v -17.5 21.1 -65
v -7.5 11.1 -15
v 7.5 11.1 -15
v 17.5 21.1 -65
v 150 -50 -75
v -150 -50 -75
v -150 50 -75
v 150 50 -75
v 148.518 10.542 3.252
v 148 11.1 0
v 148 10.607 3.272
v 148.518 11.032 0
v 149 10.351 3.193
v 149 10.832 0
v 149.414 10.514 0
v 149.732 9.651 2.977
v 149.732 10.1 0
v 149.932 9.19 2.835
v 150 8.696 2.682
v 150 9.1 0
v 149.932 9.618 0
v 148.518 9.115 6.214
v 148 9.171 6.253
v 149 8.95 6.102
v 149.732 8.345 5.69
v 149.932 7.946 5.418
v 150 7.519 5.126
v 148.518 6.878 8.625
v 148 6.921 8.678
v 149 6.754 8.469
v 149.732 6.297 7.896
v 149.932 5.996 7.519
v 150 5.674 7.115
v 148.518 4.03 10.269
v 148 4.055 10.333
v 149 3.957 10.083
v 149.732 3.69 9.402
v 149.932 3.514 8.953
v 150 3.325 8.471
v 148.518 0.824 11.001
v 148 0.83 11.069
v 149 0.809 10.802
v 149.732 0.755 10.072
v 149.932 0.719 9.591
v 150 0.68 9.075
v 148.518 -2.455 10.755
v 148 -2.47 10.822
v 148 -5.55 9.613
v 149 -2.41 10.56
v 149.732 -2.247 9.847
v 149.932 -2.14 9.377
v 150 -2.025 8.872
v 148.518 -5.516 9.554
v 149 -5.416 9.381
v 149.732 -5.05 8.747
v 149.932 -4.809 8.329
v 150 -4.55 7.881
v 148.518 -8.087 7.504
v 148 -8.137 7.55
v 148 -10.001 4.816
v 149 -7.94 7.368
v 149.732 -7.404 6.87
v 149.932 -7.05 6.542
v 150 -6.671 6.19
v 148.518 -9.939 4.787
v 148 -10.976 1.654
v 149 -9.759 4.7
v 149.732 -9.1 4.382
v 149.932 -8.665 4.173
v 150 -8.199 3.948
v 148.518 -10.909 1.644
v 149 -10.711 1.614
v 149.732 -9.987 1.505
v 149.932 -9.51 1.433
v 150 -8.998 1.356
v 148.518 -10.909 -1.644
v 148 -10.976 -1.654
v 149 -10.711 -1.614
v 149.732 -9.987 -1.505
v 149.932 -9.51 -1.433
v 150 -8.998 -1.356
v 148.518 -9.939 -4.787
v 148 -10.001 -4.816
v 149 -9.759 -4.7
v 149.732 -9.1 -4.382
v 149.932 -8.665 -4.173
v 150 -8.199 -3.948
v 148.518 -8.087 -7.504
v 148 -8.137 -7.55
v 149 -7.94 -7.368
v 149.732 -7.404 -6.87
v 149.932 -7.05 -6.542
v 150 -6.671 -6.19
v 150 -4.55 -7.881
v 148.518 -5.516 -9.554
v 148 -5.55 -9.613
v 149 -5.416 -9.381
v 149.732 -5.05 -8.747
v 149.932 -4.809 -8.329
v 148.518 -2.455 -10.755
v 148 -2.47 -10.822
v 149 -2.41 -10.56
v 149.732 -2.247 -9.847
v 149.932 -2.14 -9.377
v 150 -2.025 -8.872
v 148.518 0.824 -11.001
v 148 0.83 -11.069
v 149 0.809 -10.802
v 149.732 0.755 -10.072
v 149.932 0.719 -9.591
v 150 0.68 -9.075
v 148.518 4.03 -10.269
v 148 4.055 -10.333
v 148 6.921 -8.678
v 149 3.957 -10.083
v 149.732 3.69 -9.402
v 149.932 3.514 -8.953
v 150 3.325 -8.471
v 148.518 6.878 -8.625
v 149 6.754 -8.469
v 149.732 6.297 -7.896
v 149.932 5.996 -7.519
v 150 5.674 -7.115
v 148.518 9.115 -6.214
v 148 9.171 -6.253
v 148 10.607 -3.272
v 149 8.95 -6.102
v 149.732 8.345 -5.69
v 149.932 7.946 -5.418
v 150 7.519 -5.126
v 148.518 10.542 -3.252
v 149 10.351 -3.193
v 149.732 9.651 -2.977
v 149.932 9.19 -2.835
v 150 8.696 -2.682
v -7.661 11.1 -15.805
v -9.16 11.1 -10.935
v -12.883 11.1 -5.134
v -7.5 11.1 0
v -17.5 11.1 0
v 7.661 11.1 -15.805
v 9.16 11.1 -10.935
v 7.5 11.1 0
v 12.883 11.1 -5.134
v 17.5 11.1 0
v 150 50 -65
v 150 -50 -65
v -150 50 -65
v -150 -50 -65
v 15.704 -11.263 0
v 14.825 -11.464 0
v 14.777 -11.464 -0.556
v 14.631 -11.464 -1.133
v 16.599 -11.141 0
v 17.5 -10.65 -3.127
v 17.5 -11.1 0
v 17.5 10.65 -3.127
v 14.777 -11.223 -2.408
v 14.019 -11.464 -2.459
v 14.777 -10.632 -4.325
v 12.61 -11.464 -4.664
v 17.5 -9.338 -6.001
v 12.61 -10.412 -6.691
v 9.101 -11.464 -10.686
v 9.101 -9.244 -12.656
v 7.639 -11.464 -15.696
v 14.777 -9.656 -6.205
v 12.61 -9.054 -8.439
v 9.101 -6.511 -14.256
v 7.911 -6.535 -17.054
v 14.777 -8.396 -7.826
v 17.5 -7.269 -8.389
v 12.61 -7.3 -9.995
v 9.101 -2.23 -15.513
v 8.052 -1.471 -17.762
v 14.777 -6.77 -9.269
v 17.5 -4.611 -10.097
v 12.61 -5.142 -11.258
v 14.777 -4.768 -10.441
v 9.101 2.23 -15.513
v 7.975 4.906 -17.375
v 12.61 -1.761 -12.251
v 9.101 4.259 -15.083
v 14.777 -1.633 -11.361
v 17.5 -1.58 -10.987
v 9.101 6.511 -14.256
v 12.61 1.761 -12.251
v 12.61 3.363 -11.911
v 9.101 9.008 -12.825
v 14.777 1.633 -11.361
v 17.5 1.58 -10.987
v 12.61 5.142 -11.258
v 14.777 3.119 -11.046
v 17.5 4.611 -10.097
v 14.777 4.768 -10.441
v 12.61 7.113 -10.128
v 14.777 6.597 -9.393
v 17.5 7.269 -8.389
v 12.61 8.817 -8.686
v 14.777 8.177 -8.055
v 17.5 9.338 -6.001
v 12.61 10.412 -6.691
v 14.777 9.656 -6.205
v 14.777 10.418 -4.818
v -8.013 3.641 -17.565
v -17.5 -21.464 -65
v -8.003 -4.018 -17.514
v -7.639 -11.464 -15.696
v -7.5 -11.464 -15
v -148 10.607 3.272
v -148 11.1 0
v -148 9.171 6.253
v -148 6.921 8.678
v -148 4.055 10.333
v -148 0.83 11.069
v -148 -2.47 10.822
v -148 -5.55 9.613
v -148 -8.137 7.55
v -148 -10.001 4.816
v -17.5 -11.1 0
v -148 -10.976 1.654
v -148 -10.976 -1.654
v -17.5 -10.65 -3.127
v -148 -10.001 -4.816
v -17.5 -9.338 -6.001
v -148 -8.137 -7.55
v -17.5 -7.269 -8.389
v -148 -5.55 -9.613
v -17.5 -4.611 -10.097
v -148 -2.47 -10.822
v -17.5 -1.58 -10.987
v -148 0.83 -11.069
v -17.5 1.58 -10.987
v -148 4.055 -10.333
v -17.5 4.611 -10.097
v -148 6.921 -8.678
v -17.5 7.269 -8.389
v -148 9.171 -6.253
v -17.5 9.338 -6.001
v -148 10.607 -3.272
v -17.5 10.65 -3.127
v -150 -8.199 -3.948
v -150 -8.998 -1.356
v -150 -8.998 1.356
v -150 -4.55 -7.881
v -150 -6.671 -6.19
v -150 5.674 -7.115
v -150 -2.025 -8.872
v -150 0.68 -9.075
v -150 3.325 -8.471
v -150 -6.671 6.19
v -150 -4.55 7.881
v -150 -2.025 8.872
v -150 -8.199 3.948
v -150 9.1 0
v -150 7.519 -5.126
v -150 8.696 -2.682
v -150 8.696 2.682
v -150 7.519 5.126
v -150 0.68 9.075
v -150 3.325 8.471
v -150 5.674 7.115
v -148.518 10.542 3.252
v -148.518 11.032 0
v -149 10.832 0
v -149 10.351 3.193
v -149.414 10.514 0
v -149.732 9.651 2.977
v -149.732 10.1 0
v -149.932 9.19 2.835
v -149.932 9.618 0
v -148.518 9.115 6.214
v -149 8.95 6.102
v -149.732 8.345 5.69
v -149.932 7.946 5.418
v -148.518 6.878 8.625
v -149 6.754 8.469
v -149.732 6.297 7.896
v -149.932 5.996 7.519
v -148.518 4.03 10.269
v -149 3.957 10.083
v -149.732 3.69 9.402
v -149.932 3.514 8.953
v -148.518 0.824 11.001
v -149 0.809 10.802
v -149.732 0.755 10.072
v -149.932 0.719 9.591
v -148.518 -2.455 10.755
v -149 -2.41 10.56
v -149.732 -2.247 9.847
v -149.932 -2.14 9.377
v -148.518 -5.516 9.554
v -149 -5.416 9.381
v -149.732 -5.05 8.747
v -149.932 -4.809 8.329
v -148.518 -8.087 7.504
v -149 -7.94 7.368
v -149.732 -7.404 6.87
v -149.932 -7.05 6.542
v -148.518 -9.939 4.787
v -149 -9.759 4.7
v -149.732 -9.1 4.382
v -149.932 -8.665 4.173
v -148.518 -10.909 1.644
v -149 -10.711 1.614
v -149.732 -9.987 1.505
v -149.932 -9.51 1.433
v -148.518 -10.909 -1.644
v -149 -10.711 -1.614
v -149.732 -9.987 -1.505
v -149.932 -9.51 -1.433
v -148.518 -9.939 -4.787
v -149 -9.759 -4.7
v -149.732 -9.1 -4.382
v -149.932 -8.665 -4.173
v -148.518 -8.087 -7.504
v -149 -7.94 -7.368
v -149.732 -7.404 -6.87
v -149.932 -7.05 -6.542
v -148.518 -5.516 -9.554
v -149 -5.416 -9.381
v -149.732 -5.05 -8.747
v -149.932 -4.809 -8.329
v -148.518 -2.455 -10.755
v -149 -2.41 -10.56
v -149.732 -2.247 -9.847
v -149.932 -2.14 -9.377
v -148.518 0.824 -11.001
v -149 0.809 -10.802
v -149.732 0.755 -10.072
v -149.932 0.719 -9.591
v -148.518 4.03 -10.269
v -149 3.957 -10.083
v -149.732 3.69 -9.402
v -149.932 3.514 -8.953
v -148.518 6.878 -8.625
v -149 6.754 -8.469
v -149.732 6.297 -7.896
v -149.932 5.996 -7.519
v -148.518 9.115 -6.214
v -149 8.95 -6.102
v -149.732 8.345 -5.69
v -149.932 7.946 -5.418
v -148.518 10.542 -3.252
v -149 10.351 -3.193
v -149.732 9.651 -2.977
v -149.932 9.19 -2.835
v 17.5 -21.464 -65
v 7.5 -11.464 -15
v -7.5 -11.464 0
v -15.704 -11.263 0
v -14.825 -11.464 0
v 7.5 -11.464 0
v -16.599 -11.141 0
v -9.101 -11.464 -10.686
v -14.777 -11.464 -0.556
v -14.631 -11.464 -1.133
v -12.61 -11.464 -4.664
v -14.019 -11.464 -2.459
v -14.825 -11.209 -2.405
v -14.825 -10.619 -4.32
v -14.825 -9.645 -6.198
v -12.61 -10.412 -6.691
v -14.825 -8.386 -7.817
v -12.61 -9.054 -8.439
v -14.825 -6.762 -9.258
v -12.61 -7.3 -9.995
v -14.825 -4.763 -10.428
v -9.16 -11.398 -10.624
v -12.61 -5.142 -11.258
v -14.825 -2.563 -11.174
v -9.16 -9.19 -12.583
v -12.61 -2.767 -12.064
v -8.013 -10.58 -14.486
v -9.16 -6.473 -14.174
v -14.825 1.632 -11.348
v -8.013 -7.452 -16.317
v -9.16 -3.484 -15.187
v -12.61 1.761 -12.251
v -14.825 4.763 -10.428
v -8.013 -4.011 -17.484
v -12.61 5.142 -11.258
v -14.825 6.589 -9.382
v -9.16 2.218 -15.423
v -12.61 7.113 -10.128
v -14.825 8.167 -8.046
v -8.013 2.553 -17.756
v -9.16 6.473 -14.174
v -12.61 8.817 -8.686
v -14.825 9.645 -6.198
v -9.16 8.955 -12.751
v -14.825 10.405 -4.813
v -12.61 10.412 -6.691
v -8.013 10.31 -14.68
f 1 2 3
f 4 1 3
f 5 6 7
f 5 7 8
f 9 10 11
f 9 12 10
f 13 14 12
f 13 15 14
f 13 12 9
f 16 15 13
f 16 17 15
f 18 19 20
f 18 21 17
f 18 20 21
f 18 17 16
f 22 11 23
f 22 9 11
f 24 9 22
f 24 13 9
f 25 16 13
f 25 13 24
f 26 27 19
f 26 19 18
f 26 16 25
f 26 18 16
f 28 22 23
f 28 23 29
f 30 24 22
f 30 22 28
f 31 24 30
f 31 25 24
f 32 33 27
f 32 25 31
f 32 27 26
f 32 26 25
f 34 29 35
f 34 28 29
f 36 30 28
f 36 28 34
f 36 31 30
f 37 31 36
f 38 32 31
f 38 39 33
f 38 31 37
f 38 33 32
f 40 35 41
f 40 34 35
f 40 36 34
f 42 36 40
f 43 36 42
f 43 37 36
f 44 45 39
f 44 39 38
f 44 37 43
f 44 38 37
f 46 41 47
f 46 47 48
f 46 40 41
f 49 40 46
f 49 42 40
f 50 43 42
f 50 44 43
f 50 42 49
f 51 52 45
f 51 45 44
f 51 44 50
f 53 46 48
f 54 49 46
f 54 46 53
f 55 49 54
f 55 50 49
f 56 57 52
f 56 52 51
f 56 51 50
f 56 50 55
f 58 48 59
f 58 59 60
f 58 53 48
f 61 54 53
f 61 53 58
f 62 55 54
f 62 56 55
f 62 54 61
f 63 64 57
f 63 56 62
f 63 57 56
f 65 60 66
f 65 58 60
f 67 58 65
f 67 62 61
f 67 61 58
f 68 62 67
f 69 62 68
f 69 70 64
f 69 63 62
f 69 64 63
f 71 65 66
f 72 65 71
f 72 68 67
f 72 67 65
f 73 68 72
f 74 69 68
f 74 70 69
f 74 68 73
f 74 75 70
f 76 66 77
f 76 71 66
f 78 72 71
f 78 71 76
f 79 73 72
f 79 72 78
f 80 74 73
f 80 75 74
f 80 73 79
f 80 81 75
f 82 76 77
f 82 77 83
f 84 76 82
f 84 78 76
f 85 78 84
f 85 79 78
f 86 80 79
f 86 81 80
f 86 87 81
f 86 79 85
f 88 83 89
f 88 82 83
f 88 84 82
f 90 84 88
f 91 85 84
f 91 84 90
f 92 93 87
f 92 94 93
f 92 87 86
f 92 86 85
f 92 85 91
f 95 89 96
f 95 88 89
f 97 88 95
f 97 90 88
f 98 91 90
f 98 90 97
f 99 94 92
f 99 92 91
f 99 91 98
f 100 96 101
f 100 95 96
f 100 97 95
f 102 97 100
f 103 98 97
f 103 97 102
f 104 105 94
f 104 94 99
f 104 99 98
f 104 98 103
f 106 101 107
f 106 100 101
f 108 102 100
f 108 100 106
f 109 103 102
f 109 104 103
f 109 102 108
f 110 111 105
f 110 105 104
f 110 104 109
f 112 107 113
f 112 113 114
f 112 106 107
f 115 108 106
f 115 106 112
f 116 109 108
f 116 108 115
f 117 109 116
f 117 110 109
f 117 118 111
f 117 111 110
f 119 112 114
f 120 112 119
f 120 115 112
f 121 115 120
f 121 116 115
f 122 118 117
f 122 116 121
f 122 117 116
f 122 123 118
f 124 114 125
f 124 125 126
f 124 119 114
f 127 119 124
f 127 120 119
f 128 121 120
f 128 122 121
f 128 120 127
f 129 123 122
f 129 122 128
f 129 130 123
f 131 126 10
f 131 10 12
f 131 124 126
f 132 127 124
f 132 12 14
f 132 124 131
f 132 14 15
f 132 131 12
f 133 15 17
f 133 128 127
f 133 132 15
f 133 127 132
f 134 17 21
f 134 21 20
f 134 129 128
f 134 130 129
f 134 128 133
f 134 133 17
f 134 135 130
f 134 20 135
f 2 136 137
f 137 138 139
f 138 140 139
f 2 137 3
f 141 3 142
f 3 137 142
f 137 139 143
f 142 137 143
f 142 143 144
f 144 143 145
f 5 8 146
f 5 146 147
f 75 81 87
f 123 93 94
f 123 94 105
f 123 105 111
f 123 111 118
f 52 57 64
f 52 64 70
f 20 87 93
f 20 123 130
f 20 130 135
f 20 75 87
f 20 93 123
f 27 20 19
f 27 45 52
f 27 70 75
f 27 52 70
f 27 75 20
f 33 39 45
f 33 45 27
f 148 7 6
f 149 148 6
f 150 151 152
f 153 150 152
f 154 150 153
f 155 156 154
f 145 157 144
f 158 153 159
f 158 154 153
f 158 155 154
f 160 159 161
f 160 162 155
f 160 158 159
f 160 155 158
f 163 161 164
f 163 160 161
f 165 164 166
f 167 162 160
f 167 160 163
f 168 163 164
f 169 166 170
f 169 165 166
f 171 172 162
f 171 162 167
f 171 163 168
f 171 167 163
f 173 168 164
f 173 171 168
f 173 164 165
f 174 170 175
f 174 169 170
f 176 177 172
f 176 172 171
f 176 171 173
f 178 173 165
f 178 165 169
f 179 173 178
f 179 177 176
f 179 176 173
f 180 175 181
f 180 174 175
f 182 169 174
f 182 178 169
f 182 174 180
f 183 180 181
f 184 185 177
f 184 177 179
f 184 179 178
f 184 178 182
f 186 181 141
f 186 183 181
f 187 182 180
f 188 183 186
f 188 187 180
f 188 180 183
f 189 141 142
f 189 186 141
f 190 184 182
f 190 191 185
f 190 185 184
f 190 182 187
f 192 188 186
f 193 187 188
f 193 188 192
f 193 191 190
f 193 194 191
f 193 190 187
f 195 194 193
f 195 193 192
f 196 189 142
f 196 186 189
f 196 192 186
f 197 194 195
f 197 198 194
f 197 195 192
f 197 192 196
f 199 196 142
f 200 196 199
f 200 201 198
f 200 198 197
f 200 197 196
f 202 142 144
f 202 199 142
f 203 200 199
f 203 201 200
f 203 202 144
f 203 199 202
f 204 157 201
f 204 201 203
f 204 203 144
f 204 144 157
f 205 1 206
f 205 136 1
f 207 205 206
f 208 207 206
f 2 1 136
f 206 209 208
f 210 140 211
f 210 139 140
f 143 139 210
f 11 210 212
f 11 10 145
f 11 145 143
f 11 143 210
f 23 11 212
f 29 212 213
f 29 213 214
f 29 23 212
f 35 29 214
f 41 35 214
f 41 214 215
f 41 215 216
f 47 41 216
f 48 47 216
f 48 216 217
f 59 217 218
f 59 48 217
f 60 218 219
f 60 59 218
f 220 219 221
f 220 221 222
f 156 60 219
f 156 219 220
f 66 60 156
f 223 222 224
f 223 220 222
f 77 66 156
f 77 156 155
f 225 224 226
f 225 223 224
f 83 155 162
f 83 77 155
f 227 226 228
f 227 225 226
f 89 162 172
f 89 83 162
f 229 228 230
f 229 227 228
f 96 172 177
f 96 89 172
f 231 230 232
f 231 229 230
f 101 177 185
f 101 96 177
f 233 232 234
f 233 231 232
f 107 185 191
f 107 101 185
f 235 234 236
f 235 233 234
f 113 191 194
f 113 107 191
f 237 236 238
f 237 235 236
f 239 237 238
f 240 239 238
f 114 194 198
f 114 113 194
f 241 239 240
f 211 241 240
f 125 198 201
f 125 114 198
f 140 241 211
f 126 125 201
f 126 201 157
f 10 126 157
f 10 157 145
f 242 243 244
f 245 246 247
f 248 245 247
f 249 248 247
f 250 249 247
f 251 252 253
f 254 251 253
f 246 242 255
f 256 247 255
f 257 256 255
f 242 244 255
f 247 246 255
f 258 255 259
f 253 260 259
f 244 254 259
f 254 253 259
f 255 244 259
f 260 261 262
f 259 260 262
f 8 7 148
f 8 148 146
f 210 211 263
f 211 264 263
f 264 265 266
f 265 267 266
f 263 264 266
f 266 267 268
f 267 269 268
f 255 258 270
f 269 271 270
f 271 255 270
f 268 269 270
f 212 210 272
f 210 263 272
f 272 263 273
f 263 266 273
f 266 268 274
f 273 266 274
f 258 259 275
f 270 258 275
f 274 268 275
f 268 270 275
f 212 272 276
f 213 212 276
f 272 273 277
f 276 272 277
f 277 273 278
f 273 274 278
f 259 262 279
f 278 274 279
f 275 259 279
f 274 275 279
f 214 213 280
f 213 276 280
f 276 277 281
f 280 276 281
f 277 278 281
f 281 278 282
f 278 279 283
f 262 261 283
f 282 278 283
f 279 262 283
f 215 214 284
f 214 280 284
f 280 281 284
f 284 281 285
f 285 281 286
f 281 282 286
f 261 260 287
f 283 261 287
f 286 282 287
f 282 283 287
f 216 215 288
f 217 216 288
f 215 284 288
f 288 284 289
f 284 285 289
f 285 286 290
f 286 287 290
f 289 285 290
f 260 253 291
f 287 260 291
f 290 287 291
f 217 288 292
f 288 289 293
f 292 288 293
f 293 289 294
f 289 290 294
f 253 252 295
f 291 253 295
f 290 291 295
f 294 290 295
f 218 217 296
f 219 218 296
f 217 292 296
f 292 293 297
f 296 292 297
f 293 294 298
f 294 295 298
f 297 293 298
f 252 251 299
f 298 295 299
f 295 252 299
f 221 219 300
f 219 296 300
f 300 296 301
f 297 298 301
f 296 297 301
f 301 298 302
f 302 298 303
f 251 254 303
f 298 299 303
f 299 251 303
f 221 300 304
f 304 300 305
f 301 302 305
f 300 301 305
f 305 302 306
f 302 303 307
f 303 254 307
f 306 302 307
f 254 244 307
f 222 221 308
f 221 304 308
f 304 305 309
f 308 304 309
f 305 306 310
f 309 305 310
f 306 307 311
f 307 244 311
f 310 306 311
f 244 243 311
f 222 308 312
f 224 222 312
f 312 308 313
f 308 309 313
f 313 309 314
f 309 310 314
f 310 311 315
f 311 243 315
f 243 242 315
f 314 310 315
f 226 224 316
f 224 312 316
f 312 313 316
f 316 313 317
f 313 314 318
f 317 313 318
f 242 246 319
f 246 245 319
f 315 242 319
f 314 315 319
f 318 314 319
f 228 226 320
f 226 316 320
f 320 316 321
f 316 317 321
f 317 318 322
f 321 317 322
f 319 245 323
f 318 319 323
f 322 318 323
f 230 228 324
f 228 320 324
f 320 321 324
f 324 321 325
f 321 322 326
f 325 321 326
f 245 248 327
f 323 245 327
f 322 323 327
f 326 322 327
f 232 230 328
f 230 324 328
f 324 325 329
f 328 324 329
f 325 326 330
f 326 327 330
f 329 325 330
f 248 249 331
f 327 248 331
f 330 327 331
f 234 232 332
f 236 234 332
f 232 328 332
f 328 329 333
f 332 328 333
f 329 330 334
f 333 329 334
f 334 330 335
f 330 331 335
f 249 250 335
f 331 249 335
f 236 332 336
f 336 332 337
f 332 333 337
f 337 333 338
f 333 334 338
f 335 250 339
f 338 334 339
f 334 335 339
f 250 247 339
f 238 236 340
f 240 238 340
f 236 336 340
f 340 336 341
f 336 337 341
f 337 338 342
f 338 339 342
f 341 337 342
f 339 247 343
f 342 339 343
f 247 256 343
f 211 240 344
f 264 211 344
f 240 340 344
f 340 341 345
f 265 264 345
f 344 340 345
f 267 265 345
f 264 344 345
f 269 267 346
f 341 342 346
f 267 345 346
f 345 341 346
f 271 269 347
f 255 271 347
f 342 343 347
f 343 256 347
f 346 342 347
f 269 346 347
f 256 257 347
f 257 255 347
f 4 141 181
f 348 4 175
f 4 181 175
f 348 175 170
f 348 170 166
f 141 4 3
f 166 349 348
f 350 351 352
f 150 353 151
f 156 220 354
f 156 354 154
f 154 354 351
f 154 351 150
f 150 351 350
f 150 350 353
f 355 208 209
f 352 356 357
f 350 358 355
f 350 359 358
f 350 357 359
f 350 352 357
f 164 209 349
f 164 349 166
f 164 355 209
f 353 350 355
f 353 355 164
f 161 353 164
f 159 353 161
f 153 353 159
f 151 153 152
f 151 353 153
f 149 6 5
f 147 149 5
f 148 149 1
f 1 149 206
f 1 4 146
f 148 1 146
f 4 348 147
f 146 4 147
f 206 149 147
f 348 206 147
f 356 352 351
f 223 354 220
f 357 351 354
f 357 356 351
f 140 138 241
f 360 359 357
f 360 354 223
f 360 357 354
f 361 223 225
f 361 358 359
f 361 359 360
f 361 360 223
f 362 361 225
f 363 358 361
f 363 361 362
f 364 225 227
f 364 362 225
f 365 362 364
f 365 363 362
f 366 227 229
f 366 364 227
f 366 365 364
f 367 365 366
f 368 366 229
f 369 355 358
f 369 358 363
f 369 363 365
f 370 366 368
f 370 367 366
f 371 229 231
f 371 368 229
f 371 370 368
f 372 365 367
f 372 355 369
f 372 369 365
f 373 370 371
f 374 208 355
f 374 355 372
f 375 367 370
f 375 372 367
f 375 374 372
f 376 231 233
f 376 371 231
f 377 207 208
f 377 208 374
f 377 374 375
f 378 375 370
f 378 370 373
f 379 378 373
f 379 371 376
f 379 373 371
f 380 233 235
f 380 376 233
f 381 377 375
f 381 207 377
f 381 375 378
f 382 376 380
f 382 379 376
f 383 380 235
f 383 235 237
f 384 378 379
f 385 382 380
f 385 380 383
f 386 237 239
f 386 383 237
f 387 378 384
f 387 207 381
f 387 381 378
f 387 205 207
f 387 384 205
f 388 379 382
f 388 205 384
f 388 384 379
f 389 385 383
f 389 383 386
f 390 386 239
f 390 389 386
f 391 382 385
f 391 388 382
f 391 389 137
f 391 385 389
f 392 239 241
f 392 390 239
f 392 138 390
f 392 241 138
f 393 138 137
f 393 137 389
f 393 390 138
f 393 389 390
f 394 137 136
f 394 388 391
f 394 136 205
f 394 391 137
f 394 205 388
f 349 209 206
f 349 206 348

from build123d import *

# Parameters (mm, degrees)
F0_R         = 11.1
F1_DEPTH     = 150
F2_W         = 22.5644709975
F2_H         = 75
F4_DEPTH     = 7.5
F5_W         = 300
F5_H         = 100
F5_W_2       = 15
F5_H_2       = 22.5644709975
F7_DEPTH     = 10
F8_SIZE2     = 50
F8_SIZE      = 10
F9_T4_ANGLE  = 180
F9_T10_ANGLE = 180


# Not quite as in the source:
# - a fillet or chamfer that OpenCascade refuses, or shapes differently, is made with other operations: its cross-section is extruded or revolved along the edge and cut away or added


with BuildPart() as f1:
    # F0 (on Right) → F1 (new body, symmetric)
    with BuildSketch(Plane.YZ):
        Circle(F0_R)
    extrude(amount=F1_DEPTH, both=True)

    # F2 (on Right) → F4 (join, symmetric)
    with BuildSketch(Plane.YZ):
        with Locations((-0.1822354987, -37.5)):
            Rectangle(F2_W, F2_H)
    extrude(amount=F4_DEPTH, both=True)

    # F6: fillet of radius 2 on 2 edges, made by hand

    # F6_s1 → F6_t2 (revolve, cut)
    with BuildSketch(Plane.XY):
        with BuildLine():
            ThreePointArc((-148, 11.1), (-149.4142135624, 10.5142135624), (-150, 9.1))
            Line((-150, 9.1), (-150, 11.1))
            Line((-150, 11.1), (-148, 11.1))
        make_face()
    revolve(axis=Axis((-150, 0, 0), (1, 0, 0)), mode=Mode.SUBTRACT)

    # F6_s3 → F6_t4 (revolve, cut)
    with BuildSketch(Plane.XY):
        with BuildLine():
            ThreePointArc((148, 11.1), (149.4142135624, 10.5142135624), (150, 9.1))
            Line((150, 9.1), (150, 11.1))
            Line((150, 11.1), (148, 11.1))
        make_face()
    revolve(axis=Axis((150, 0, 0), (1, 0, 0)), mode=Mode.SUBTRACT)

    # F5 (on face) → F7 (join)
    with BuildSketch(Plane(origin=(0, 0, -75), x_dir=(1, 0, 0), z_dir=(0, 0, -1))):
        Rectangle(F5_W, F5_H)
        with Locations((0, 0.1822354987)):
            Rectangle(F5_W_2, F5_H_2, mode=Mode.SUBTRACT)
    extrude(amount=-F7_DEPTH)

    # F8
    f8_edges = [f1.edges().sort_by_distance(p)[0] for p in [
        (7.5, -0.182235, -65),
        (0, -11.464471, -65),
        (0, 11.1, -65),
        (-7.5, -0.182235, -65),
    ]]
    f8_side = f1.faces().sort_by_distance((146.837722, 0, -65))[0]
    chamfer(f8_edges, length=F8_SIZE, length2=F8_SIZE2, reference=f8_side)

    # F9: fillet of radius 10 on 2 edges, made by hand


with BuildPart() as f9_tool2:
    # F9_s3 → F9_t4 (revolve)
    with BuildSketch(Plane.XY):
        with BuildLine():
            ThreePointArc((7.5, -21.1), (10.4289321881, -14.0289321881), (17.5, -11.1))
            Line((17.5, -11.1), (7.5, -11.1))
            Line((7.5, -11.1), (7.5, -21.1))
        make_face()
    revolve(axis=Axis((7.5, 0, 0), (1, 0, 0)), revolution_arc=F9_T4_ANGLE)

    split(bisect_by=Plane.XZ.offset(-11.1), keep=Keep.TOP)

    split(bisect_by=Plane.XZ.offset(11.4644709975), keep=Keep.BOTTOM)


with BuildPart() as f1_1:
    add(f1.part)

    # F9_t1: union F9_tool2
    add(f9_tool2.part)


with BuildPart() as f9_tool8:
    # F9_s9 → F9_t10 (revolve)
    with BuildSketch(Plane.XY):
        with BuildLine():
            ThreePointArc((-17.5, -11.1), (-10.4289321881, -14.0289321881), (-7.5, -21.1))
            Line((-7.5, -21.1), (-7.5, -11.1))
            Line((-7.5, -11.1), (-17.5, -11.1))
        make_face()
    revolve(axis=Axis((-7.5, 0, 0), (1, 0, 0)), revolution_arc=F9_T10_ANGLE)

    split(bisect_by=Plane.XZ.offset(-11.1), keep=Keep.TOP)

    split(bisect_by=Plane.XZ.offset(11.4644709975), keep=Keep.BOTTOM)


with BuildPart() as f1_2:
    add(f1_1.part)

    # F9_t7: union F9_tool8
    add(f9_tool8.part)


solid = f1_2.part
